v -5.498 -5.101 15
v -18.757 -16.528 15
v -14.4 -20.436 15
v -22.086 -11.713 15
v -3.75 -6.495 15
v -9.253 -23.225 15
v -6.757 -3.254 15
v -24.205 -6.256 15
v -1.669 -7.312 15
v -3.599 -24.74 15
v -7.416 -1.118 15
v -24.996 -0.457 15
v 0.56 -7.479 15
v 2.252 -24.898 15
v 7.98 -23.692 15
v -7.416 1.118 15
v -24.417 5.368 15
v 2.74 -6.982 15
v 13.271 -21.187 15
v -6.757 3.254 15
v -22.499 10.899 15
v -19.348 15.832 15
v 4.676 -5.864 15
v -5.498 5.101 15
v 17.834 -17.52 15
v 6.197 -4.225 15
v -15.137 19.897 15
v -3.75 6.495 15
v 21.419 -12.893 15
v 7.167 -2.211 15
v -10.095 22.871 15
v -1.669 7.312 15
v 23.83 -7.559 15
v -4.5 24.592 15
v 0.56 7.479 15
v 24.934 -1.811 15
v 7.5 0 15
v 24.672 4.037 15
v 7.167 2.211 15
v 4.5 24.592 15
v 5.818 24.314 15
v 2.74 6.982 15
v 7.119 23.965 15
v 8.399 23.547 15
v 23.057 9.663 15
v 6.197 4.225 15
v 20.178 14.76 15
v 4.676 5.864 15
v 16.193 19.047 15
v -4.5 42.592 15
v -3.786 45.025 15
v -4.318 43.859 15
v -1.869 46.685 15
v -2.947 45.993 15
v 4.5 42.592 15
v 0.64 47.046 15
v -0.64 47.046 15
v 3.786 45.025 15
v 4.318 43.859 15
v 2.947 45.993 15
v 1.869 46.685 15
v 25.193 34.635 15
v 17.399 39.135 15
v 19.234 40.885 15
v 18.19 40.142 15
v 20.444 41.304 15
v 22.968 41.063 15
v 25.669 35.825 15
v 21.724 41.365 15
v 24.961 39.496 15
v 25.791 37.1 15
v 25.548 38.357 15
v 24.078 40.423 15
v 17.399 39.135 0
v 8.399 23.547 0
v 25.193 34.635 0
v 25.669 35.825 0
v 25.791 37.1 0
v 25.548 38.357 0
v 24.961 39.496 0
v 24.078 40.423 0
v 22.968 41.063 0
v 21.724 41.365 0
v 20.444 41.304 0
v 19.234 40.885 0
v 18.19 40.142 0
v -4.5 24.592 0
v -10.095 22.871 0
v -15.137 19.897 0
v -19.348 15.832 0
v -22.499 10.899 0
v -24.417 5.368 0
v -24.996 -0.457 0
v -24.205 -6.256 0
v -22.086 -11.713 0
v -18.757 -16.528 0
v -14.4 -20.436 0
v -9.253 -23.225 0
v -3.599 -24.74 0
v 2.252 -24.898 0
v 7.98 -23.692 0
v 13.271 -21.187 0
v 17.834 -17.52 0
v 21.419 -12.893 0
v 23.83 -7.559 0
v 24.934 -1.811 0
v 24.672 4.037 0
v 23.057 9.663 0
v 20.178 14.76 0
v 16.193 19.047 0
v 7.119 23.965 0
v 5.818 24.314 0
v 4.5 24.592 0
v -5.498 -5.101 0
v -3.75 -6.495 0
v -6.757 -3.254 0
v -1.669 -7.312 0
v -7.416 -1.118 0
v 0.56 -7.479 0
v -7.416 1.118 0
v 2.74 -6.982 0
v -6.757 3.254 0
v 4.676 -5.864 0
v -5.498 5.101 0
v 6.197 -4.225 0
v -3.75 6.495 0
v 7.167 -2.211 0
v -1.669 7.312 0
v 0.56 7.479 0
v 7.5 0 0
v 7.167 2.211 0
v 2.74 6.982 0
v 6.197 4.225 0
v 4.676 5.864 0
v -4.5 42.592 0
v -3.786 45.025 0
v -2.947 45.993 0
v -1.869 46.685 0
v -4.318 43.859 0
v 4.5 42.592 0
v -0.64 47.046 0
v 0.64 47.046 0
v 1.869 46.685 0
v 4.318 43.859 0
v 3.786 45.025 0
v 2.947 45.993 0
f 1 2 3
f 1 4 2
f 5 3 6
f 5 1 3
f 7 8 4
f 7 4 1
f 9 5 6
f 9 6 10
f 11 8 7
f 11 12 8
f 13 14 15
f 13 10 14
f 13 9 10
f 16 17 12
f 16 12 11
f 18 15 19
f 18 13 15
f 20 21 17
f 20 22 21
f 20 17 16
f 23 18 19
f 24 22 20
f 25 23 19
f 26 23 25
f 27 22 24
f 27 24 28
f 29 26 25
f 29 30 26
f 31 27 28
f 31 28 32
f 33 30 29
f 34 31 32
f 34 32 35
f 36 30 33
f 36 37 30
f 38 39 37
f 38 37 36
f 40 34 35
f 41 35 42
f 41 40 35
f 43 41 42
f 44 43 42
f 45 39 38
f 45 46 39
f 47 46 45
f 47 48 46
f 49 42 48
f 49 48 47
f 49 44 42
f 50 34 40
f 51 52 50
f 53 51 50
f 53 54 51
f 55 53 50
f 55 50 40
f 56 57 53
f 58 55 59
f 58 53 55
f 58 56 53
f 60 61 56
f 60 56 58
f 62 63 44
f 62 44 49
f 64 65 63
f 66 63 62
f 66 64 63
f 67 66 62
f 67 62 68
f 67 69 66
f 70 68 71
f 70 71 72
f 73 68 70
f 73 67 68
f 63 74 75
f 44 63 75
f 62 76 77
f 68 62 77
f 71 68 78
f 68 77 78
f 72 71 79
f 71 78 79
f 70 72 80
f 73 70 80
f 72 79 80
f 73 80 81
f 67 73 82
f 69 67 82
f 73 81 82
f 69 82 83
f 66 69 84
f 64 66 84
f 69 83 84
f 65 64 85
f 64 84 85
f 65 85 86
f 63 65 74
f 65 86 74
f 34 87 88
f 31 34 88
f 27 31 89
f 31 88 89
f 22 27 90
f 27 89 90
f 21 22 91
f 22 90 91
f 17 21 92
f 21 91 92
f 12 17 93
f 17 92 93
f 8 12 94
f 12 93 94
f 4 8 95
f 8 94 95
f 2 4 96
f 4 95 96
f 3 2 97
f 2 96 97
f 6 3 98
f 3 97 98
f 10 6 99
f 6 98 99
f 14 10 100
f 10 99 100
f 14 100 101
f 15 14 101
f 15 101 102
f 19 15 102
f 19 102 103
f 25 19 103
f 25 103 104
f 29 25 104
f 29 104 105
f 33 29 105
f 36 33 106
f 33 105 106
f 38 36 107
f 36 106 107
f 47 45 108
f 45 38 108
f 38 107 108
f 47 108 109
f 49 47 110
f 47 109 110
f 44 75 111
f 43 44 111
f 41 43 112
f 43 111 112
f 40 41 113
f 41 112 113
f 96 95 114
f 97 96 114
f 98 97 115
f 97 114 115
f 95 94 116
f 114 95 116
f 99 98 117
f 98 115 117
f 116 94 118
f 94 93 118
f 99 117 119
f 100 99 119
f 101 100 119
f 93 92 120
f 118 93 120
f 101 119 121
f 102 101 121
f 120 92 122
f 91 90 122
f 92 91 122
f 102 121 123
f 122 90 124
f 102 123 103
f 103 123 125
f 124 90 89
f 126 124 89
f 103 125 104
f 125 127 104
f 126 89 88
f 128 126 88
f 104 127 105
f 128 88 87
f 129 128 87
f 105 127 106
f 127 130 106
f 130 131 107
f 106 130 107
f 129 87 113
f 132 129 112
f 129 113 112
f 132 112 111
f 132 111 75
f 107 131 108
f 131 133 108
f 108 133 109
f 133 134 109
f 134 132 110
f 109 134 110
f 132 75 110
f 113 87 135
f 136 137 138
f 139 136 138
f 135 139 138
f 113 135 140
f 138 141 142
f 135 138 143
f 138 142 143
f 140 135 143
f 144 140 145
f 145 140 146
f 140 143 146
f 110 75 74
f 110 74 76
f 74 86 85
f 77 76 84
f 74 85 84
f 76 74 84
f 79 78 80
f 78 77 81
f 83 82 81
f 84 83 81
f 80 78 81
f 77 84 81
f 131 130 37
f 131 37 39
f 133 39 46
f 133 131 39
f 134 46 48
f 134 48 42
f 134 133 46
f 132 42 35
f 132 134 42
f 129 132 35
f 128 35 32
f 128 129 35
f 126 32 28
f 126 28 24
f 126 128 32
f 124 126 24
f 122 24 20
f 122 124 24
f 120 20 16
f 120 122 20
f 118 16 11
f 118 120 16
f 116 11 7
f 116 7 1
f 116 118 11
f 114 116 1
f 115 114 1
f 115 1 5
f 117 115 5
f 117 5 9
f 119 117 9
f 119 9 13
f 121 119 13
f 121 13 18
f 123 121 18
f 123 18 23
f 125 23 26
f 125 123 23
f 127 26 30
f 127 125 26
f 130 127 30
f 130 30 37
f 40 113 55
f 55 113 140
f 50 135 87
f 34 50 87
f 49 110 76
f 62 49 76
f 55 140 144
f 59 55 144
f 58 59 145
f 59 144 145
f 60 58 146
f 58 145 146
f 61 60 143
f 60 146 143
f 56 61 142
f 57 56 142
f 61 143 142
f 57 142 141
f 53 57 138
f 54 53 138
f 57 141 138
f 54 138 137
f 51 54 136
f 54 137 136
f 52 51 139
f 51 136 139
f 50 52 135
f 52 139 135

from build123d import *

# Parameters (mm, degrees)
SKETCH1_R           = 25
SKETCH1_R_2         = 7.5
BOSS_EXTRUDE1_DEPTH = 15


with BuildPart() as part:
    # Sketch1 → Boss-Extrude1 (new body)
    # profile 1 of 3: a face of its own
    with BuildSketch(Plane.XY):
        Circle(SKETCH1_R)
        Circle(SKETCH1_R_2, mode=Mode.SUBTRACT)
    # profile 2 of 3: a face of its own
    with BuildSketch(Plane.XY):
        with BuildLine():
            Line((-4.5, 42.591665255), (-4.5, 24.591665255))
            ThreePointArc((-4.5, 24.591665255), (0, 25), (4.5, 24.591665255))
            Line((4.5, 24.591665255), (4.5, 42.591665255))
            ThreePointArc((4.5, 42.591665255), (0, 47.091665255), (-4.5, 42.591665255))
        make_face()
    # profile 3 of 3: a face of its own
    with BuildSketch(Plane.XY):
        with BuildLine():
            Line((17.39871831, 39.1354641), (8.39871831, 23.547006832))
            ThreePointArc((8.39871831, 23.547006832), (12.5, 21.650635095), (16.192946944, 19.047006832))
            Line((16.192946944, 19.047006832), (25.192946944, 34.6354641))
            ThreePointArc((25.192946944, 34.6354641), (23.545832627, 40.782578417), (17.39871831, 39.1354641))
        make_face()
    extrude(amount=BOSS_EXTRUDE1_DEPTH)


solid = part.part
